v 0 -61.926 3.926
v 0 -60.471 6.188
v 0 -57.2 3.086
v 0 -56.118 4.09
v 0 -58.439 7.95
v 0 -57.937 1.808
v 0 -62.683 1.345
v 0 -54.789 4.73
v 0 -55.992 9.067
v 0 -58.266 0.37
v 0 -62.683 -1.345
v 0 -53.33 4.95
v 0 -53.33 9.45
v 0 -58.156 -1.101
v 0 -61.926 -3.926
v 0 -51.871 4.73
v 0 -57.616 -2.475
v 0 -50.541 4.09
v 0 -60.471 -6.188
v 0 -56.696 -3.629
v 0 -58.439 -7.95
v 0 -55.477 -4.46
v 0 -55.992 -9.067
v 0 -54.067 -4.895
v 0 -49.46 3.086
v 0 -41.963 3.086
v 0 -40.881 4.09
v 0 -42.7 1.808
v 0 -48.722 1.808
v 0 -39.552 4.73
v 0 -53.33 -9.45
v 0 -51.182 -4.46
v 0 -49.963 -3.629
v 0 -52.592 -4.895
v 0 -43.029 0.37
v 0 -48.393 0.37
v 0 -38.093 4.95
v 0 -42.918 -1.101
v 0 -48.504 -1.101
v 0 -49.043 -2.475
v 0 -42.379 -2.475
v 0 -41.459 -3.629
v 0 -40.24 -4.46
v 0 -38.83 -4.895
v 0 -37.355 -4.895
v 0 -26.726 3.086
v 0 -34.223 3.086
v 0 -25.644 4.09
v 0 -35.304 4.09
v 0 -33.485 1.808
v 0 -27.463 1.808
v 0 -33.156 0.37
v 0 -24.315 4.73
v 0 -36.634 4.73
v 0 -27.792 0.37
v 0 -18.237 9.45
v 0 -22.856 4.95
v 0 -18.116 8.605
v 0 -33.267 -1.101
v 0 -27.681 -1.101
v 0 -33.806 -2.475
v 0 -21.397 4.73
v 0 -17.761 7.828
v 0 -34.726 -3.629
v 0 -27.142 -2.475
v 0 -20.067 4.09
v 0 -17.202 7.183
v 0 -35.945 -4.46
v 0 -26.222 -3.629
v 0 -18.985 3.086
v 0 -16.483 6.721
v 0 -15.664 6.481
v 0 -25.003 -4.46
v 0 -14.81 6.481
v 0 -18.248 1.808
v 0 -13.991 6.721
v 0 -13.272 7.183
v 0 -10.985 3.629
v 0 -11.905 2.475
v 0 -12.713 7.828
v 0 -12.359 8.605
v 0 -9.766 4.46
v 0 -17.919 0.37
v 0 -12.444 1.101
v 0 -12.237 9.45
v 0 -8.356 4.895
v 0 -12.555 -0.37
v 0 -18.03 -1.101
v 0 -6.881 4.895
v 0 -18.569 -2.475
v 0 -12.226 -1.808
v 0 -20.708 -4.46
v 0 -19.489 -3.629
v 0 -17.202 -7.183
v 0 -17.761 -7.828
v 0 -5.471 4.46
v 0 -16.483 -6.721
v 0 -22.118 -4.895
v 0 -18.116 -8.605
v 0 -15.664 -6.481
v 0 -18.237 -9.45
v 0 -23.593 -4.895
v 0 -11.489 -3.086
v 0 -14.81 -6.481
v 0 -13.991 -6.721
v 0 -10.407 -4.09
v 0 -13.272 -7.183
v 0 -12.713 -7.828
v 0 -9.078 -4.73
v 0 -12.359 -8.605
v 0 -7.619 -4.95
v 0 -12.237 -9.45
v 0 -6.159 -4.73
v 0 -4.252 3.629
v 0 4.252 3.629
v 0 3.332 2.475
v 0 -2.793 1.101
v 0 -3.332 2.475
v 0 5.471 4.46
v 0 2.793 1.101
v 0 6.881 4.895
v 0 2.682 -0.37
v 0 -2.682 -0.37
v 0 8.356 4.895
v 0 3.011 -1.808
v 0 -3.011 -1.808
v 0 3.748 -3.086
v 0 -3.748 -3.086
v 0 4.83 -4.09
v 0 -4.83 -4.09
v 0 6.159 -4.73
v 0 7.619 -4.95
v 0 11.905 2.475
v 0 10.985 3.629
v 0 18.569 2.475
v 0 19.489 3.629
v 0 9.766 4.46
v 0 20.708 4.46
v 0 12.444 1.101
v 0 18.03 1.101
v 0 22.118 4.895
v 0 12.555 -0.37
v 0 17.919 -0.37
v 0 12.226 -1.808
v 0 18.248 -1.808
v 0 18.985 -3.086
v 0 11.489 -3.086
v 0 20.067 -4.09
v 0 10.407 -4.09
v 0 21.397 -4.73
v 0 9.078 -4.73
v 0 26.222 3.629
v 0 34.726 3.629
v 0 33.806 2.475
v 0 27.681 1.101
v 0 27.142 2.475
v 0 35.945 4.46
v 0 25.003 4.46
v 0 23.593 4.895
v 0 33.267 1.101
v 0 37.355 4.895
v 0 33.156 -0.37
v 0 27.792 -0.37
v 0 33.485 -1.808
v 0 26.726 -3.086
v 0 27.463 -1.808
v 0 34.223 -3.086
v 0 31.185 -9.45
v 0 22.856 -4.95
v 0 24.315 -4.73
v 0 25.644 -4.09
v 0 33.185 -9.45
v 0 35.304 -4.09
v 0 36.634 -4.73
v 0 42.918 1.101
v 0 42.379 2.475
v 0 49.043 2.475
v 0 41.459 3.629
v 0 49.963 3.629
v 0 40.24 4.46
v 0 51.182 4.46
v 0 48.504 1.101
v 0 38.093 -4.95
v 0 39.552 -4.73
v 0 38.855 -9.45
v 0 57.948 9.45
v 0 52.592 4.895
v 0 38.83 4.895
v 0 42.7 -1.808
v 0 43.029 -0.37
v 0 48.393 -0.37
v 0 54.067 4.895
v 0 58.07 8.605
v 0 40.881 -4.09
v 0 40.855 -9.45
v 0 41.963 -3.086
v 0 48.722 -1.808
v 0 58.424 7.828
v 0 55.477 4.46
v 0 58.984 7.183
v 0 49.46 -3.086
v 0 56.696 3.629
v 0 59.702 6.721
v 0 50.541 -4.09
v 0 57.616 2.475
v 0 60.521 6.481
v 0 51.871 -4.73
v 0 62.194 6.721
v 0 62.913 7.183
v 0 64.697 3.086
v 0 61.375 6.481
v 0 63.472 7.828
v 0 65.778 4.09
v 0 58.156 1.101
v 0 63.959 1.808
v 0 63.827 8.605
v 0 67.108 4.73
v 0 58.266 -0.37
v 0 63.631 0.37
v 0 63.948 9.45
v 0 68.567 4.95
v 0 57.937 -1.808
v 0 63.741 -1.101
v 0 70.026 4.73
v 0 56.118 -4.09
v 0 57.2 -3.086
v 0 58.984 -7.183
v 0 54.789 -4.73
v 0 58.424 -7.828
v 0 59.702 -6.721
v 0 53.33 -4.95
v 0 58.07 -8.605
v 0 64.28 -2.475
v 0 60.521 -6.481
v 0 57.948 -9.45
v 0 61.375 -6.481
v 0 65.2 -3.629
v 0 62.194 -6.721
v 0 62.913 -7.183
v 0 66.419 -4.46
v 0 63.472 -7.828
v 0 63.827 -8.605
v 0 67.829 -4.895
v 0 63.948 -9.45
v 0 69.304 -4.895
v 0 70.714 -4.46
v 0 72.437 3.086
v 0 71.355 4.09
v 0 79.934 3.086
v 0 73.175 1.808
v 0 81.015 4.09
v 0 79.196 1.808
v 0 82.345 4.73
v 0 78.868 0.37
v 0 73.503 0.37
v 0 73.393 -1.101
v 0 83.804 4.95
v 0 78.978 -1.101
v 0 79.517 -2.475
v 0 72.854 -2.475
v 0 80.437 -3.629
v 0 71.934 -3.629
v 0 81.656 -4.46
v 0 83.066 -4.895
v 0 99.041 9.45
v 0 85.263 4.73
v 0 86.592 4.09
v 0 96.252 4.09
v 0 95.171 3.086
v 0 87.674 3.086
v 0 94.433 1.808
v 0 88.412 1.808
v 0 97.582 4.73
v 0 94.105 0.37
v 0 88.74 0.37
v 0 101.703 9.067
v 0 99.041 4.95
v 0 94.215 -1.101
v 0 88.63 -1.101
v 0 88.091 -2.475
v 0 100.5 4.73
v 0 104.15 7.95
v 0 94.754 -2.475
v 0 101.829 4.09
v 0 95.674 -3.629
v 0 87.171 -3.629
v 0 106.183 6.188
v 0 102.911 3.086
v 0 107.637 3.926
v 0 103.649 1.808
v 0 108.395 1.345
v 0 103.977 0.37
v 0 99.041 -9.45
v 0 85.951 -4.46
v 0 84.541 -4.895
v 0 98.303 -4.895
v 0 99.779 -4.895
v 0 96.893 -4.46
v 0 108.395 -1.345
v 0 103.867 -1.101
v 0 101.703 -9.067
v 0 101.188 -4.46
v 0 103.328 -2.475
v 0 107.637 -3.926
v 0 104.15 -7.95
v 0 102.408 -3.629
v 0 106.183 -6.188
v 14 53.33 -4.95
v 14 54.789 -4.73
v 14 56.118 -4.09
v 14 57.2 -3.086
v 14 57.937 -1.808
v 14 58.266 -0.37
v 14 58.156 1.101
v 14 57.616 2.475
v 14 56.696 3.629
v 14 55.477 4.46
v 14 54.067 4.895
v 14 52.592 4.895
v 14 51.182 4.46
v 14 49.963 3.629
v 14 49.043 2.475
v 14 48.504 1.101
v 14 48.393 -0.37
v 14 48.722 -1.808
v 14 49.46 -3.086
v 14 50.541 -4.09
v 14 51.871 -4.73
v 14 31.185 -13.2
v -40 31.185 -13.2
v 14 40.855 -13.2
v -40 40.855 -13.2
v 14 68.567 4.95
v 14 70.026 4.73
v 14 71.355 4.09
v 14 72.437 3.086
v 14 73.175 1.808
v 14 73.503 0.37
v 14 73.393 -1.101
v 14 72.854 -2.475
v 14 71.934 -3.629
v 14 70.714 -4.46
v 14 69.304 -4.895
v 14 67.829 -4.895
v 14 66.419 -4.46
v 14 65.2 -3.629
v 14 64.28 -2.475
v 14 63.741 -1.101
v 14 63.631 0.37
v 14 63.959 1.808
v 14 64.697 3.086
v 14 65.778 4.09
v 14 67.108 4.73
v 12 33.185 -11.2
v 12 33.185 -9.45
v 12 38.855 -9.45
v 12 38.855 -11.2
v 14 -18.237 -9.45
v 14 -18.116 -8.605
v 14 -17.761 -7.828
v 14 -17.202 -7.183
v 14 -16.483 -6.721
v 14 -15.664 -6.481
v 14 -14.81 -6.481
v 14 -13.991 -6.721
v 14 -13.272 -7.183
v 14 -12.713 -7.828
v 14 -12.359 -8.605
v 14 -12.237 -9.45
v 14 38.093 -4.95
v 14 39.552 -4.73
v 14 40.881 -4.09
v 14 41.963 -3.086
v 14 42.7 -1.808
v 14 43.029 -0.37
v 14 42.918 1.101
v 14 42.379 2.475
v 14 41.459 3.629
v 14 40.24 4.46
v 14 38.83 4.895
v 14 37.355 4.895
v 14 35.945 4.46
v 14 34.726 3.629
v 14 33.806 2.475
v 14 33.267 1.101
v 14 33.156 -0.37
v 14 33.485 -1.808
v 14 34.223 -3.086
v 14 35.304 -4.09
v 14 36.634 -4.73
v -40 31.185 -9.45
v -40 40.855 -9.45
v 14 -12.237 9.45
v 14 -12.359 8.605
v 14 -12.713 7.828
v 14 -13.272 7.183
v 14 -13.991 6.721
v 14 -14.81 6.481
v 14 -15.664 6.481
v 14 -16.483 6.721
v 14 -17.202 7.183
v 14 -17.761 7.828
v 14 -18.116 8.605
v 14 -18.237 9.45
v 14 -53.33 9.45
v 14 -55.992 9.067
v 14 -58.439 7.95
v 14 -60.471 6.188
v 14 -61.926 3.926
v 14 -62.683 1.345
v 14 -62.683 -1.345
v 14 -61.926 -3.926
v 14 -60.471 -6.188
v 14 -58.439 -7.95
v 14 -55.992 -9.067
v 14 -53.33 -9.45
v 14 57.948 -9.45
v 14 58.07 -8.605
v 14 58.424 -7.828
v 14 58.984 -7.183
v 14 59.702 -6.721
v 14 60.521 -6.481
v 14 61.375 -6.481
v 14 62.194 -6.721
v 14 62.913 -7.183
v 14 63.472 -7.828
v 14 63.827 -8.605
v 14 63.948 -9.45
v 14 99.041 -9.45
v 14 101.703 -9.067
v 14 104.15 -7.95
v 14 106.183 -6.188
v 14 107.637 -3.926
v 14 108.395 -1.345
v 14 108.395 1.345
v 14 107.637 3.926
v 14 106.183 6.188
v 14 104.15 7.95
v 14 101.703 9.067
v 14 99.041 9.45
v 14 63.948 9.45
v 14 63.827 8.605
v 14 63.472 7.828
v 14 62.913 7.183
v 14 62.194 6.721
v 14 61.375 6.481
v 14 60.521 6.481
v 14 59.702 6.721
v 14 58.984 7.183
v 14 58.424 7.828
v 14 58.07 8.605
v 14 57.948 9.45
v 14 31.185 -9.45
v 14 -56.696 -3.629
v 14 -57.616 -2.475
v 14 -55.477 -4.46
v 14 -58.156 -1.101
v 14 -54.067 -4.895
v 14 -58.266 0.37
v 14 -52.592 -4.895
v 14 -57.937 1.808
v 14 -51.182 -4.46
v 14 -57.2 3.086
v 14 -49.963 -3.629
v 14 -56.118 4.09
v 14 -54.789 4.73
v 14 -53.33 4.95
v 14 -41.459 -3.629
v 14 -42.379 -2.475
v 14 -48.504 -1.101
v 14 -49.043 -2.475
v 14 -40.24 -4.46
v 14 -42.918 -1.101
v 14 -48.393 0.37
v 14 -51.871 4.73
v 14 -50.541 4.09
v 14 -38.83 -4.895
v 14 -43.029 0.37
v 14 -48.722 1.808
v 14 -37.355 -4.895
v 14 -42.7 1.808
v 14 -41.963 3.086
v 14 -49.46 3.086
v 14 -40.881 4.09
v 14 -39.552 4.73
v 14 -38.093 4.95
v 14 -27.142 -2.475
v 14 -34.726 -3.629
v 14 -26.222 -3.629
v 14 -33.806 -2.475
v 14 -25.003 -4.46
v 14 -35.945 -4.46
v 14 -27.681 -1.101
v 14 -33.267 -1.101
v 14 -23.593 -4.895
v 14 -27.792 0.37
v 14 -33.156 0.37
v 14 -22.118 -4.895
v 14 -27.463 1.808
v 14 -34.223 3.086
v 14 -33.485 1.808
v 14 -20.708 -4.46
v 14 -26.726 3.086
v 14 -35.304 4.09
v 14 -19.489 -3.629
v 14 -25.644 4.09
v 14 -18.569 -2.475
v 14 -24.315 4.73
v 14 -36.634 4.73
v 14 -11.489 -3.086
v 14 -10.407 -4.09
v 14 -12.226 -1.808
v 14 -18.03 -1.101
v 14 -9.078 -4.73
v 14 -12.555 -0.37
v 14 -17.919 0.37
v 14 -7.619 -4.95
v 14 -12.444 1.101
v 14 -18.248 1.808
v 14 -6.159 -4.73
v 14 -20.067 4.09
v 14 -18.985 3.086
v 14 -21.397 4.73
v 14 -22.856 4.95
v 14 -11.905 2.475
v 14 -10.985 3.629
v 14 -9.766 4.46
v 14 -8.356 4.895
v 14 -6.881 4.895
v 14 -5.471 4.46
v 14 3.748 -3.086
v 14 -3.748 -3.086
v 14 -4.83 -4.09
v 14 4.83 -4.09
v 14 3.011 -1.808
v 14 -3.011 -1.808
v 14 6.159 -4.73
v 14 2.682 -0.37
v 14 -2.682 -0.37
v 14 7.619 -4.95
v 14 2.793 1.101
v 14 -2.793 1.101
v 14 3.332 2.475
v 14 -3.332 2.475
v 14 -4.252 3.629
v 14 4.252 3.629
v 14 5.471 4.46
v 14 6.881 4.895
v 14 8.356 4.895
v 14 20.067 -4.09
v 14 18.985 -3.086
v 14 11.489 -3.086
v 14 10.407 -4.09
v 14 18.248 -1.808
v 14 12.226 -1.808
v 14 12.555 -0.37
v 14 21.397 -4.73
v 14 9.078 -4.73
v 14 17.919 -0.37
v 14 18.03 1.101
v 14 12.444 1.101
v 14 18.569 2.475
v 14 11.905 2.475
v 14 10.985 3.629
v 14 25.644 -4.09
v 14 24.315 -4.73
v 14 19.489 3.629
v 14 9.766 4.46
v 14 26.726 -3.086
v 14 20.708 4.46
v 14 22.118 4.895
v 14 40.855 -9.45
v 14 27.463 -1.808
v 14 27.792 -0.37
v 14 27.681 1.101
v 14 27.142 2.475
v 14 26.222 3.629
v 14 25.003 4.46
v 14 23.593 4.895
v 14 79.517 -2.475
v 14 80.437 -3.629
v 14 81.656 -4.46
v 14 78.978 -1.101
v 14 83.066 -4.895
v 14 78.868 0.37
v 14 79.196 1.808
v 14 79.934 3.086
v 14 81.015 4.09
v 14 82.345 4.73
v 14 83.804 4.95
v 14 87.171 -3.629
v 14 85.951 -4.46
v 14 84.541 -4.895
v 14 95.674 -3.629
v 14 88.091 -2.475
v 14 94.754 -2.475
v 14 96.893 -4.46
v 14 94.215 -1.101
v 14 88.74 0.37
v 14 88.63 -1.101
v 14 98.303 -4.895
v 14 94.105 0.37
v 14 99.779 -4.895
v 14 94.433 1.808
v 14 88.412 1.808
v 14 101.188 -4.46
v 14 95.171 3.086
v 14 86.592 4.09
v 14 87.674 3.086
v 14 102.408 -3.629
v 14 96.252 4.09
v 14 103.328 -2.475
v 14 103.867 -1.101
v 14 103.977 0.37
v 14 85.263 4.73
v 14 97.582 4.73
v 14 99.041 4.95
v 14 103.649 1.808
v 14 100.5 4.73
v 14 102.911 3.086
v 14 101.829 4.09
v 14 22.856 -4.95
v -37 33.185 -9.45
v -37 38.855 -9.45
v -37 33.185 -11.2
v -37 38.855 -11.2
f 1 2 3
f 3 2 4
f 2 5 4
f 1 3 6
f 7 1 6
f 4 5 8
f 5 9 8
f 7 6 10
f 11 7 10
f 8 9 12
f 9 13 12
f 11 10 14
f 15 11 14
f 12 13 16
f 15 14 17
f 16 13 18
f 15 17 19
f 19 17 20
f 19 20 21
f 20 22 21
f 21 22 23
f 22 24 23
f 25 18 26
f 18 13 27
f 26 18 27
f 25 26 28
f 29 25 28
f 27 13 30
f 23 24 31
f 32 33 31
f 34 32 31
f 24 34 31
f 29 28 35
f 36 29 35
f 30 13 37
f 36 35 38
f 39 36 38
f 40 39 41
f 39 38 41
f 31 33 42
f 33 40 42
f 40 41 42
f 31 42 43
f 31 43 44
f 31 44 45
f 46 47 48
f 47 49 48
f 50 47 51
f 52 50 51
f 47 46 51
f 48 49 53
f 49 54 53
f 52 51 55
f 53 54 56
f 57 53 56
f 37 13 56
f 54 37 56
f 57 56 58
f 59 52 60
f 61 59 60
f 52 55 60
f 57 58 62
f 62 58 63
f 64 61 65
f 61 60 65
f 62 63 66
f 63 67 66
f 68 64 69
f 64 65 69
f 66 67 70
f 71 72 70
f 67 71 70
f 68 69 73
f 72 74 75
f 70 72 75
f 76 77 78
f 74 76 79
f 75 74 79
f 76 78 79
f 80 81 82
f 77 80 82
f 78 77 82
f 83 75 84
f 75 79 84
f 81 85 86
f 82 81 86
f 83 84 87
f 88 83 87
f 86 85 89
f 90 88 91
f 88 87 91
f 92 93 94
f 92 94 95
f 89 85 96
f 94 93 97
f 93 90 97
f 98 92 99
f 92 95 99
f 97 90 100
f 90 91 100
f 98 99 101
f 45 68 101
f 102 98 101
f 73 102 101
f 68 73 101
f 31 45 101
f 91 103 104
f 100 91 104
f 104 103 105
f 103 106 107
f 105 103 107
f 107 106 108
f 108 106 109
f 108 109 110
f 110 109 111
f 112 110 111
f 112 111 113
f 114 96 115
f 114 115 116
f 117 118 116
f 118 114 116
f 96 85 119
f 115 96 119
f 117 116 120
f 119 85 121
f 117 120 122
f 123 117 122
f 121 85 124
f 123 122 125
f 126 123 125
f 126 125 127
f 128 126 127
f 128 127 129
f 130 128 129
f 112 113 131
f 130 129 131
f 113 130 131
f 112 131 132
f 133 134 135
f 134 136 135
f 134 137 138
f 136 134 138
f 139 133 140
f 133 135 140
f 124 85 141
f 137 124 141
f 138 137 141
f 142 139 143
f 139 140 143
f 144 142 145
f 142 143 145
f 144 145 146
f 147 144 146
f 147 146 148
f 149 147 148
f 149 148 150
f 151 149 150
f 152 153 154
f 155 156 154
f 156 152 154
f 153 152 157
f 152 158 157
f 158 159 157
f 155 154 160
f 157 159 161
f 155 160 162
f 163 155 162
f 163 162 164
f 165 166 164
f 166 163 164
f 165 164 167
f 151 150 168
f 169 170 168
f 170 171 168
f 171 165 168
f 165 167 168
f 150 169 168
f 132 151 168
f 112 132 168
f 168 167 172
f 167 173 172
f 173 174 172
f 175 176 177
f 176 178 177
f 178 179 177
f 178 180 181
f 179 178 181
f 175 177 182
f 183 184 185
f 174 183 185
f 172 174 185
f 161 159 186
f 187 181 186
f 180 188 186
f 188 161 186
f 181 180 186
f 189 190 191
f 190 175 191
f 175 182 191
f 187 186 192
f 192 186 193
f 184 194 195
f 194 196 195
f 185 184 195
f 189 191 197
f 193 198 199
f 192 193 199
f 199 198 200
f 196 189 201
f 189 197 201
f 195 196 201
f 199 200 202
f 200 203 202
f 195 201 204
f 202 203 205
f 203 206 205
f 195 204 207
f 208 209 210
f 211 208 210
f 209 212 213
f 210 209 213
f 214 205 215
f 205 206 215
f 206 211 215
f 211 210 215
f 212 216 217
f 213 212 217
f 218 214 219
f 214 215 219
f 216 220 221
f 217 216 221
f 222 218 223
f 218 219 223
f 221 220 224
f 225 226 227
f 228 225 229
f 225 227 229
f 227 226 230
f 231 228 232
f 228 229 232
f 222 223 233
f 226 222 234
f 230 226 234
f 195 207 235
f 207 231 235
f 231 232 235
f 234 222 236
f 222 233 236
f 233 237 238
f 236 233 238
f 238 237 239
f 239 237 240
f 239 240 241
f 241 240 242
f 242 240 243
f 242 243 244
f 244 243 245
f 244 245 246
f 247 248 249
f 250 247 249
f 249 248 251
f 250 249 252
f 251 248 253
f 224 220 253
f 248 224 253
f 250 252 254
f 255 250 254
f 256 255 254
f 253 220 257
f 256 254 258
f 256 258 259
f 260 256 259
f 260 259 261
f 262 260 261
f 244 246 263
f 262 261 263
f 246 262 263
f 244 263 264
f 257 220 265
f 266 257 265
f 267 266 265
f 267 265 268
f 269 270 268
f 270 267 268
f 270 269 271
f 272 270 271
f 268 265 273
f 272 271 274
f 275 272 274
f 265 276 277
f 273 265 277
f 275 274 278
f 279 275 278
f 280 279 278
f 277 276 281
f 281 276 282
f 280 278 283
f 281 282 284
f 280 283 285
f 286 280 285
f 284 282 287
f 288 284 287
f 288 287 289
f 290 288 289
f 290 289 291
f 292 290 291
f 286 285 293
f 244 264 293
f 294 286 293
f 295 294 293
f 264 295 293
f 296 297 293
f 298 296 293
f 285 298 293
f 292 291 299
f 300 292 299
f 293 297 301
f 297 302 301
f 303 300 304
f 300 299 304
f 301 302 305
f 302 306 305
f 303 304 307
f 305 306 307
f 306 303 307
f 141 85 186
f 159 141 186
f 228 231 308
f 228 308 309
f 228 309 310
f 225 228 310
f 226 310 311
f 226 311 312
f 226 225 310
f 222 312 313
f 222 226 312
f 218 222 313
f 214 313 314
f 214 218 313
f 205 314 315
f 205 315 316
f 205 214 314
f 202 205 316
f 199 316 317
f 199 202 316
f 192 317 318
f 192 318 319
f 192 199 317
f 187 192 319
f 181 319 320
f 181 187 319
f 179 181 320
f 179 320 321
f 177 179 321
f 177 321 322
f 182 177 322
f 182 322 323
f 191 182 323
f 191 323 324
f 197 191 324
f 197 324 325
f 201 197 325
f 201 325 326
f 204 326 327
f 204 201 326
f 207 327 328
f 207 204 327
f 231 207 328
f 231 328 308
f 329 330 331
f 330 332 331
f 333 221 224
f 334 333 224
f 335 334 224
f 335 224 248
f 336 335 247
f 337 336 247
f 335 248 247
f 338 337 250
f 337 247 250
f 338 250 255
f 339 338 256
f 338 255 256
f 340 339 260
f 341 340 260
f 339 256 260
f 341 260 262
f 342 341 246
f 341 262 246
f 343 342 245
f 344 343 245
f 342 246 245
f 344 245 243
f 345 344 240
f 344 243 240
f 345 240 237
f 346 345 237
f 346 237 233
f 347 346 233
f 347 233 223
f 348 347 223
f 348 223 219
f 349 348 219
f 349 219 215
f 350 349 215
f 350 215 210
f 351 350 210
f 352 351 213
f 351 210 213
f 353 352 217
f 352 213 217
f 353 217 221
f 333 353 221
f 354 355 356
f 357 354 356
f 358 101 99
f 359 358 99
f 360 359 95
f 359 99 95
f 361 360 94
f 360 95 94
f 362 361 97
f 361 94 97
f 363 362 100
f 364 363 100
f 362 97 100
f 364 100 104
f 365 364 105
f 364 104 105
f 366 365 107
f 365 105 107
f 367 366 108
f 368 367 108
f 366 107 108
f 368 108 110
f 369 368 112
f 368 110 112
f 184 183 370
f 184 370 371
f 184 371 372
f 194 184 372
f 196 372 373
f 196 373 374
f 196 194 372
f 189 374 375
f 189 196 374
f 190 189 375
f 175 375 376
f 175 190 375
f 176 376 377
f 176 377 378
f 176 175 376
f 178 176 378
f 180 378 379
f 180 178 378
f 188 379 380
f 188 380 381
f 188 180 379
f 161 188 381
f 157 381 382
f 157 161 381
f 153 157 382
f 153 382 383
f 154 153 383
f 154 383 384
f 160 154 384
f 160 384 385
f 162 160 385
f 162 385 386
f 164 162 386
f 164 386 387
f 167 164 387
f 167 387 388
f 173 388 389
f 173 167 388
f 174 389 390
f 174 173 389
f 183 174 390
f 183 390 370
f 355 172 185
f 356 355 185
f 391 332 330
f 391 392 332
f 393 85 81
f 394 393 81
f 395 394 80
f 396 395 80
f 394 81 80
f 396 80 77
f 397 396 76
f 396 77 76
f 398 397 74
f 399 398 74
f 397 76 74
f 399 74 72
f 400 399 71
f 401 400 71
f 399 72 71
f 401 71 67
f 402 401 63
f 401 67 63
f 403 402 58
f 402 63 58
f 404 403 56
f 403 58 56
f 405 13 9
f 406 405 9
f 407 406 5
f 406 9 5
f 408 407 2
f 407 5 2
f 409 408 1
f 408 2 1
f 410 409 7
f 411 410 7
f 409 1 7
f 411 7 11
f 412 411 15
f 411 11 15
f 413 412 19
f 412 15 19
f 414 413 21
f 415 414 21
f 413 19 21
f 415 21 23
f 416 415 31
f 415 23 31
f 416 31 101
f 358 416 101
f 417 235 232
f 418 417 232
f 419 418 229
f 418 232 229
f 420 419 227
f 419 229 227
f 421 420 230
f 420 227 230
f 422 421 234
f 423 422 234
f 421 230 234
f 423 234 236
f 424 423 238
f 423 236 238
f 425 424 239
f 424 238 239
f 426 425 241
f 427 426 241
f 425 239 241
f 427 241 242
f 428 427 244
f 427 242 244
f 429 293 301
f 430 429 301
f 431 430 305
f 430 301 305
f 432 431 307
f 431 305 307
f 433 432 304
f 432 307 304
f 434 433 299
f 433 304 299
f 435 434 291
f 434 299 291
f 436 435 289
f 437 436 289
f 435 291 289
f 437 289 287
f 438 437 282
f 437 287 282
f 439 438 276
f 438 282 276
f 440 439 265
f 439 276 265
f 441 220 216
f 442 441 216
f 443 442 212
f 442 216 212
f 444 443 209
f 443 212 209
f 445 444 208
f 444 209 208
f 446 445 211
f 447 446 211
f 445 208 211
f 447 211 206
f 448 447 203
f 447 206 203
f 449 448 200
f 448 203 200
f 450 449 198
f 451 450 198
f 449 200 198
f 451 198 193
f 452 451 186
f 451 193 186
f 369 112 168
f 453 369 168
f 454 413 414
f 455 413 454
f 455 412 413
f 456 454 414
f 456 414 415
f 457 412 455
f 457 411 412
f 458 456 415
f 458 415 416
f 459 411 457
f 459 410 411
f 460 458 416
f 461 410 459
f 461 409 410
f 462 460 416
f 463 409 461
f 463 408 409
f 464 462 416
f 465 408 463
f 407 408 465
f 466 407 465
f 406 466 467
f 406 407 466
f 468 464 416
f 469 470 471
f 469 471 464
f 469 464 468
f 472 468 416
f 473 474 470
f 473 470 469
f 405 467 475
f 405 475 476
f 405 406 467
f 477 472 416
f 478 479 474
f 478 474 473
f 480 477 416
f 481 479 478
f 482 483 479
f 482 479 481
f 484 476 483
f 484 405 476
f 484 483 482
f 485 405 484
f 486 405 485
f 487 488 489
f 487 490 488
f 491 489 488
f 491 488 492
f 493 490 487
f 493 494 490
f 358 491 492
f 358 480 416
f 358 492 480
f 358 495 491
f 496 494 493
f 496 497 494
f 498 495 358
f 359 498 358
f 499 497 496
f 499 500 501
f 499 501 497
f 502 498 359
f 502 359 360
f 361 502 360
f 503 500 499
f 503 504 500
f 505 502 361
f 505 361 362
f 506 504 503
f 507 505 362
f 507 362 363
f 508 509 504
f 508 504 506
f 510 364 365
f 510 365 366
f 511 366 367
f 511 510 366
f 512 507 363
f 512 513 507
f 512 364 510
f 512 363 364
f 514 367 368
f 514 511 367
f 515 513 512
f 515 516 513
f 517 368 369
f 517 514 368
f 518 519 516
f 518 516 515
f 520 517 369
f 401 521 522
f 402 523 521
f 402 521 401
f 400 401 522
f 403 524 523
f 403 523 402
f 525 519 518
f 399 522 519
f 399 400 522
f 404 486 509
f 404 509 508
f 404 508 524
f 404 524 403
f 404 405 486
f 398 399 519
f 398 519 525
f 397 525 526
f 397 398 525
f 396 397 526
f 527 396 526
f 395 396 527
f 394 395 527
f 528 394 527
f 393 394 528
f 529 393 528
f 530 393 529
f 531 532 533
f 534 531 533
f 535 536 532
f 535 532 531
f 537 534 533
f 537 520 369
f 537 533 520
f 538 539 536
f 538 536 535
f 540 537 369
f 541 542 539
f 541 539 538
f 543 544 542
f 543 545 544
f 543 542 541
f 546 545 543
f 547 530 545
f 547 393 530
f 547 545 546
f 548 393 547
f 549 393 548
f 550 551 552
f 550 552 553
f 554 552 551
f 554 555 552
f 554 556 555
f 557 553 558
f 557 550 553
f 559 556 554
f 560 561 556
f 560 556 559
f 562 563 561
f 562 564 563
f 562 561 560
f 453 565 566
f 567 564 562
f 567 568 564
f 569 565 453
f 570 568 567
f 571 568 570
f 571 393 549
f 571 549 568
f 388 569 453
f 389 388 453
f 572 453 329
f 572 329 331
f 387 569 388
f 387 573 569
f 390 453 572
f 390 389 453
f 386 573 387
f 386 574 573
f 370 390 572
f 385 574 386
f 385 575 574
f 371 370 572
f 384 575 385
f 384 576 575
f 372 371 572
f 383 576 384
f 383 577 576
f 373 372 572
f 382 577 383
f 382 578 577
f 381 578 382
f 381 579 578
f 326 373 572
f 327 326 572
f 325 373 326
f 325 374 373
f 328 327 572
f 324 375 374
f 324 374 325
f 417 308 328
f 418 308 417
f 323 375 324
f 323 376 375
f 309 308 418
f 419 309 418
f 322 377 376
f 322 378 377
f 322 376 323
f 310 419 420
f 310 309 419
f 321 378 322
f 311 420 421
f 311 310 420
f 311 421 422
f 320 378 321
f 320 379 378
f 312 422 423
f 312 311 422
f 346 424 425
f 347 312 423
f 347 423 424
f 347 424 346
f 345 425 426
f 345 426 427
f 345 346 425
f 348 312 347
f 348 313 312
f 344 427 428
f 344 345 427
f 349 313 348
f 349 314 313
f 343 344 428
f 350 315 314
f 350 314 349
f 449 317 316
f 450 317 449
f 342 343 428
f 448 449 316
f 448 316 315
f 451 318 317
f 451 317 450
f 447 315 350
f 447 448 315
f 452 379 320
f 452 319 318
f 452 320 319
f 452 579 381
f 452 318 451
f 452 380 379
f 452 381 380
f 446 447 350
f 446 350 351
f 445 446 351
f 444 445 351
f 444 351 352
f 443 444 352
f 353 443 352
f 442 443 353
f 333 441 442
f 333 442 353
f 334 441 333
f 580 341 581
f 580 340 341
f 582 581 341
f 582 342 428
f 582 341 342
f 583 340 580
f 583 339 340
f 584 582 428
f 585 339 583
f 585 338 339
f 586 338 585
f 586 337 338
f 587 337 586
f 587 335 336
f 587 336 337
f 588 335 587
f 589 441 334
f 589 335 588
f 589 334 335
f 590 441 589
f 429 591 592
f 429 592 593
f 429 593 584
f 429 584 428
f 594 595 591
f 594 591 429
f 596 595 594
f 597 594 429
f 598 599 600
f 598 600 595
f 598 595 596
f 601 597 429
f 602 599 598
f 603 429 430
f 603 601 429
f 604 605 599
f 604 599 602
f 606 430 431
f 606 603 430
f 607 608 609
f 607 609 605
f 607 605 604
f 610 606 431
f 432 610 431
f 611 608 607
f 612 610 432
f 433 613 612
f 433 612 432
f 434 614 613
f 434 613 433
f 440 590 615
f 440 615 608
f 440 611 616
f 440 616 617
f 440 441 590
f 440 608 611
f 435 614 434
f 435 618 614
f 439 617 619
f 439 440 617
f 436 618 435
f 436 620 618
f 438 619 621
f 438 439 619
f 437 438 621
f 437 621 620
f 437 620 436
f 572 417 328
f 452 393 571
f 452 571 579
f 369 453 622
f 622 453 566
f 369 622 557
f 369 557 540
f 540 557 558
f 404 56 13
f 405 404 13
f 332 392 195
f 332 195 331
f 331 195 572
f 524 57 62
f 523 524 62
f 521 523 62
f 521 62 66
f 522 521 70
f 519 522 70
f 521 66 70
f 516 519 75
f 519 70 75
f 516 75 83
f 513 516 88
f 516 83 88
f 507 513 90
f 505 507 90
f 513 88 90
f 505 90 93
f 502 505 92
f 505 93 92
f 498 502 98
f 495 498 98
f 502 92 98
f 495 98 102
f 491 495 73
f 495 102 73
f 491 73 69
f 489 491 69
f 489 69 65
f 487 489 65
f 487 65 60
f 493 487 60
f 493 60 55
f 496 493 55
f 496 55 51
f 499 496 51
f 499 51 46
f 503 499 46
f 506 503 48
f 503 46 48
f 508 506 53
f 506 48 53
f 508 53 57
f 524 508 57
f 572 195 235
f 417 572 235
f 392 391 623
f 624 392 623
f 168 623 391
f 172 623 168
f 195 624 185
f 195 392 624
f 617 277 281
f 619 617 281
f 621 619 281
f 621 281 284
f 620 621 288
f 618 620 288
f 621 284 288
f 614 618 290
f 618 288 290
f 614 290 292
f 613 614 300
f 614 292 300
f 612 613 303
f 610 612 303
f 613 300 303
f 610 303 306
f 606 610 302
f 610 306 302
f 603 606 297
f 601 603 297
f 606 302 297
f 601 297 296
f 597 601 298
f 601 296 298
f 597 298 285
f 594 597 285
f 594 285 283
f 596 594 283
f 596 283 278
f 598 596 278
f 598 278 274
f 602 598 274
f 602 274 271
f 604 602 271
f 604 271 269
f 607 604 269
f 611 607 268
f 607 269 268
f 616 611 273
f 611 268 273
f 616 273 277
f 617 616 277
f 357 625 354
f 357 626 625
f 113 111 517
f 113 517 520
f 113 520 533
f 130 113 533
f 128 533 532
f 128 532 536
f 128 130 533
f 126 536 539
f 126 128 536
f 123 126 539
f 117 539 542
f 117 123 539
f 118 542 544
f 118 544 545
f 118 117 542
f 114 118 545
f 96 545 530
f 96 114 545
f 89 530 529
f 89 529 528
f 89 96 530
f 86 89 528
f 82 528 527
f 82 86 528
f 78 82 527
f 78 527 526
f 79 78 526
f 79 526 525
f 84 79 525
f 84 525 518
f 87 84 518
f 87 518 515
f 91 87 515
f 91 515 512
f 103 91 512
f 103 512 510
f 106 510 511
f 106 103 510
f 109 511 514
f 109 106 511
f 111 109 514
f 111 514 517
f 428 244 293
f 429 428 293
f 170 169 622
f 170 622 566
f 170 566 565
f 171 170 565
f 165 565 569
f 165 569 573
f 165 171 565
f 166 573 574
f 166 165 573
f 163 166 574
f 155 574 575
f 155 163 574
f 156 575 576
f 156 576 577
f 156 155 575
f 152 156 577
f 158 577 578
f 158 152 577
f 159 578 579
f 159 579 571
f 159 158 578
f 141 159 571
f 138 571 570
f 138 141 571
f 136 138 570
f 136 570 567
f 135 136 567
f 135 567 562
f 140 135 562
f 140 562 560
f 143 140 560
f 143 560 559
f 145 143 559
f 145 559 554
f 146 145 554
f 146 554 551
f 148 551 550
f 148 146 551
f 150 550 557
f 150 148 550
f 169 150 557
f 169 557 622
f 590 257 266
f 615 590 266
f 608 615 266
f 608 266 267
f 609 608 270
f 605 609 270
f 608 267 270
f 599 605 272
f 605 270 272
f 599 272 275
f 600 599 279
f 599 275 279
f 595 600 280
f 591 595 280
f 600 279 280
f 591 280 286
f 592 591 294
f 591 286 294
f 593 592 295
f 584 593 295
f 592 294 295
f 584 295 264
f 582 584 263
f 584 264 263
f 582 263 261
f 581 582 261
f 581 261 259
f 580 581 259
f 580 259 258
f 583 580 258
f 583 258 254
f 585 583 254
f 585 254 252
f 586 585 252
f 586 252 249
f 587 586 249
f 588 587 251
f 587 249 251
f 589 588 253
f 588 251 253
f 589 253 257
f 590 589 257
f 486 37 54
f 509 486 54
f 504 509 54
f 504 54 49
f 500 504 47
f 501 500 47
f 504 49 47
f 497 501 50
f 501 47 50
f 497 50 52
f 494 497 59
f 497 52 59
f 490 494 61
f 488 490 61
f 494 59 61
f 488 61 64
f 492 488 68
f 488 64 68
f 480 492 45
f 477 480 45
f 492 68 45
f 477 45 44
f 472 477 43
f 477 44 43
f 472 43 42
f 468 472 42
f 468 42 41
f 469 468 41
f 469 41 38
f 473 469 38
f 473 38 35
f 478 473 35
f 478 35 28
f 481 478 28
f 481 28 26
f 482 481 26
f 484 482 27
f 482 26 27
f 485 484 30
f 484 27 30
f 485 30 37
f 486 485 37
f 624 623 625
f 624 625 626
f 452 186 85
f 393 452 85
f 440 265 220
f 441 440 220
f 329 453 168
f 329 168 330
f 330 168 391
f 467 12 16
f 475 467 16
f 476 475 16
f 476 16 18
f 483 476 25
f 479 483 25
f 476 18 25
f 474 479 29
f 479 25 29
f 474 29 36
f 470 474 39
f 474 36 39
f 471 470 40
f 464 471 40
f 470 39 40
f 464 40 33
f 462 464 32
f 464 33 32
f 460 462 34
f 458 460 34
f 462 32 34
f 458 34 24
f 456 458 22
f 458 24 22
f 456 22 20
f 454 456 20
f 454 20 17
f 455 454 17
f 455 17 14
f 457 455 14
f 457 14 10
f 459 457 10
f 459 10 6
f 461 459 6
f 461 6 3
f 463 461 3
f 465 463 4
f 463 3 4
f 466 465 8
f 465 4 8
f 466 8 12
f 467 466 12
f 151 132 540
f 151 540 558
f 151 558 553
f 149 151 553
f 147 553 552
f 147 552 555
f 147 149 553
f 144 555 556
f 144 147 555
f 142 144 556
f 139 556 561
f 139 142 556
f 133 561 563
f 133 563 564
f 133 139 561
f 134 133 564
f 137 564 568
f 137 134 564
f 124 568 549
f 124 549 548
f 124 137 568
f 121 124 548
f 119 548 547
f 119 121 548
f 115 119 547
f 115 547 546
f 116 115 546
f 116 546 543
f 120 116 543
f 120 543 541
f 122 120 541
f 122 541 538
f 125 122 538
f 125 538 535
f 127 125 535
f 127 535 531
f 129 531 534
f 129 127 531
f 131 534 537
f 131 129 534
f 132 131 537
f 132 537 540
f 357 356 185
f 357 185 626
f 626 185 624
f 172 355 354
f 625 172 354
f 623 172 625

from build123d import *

# Parameters (mm, degrees)
SKETCH_1_R      = 4.95
EXTRUDE_1_DEPTH = 14
SKETCH_3_W      = 14
SKETCH_3_H      = 60.948164725
EXTRUDE_2_DEPTH = 3
SKETCH_4_R      = 4.95
EXTRUDE_3_DEPTH = 14
SKETCH_5_W      = 49
SKETCH_5_H      = 5.67
EXTRUDE_4_DEPTH = 1.75
EXTRUDE_5_DEPTH = 2


with BuildPart() as part:
    # Эскиз1 → Бобышка-Вытянуть1 (new body)
    with BuildSketch(Plane(origin=(0, 0, 0), x_dir=(0, 0, -1), z_dir=(1, 0, 0))):
        with BuildLine():
            Line((6.45, 38.092602953), (6.45, 53.329644134))
            ThreePointArc((6.45, 53.329644134), (0, 59.779644134), (-6.45, 53.329644134))
            Line((-6.45, 53.329644134), (-6.45, 38.092602953))
            Line((-6.45, 38.092602953), (-6.45, 22.855561772))
            Line((-6.45, 22.855561772), (-6.45, 7.618520591))
            Line((-6.45, 7.618520591), (-6.45, -7.618520591))
            ThreePointArc((-6.45, -7.618520591), (0, -14.068520591), (6.45, -7.618520591))
            Line((6.45, -7.618520591), (6.45, 7.618520591))
            Line((6.45, 7.618520591), (6.45, 22.855561772))
            Line((6.45, 22.855561772), (6.45, 38.092602953))
        make_face()
        with Locations((0, 7.618520591)):
            Circle(SKETCH_1_R, mode=Mode.SUBTRACT)
        with Locations((0, -7.618520591)):
            Circle(SKETCH_1_R, mode=Mode.SUBTRACT)
        with Locations((0, 22.855561772)):
            Circle(SKETCH_1_R, mode=Mode.SUBTRACT)
        with Locations((0, 38.092602953)):
            Circle(SKETCH_1_R, mode=Mode.SUBTRACT)
        with Locations((0, 53.329644134)):
            Circle(SKETCH_1_R, mode=Mode.SUBTRACT)
    extrude(amount=EXTRUDE_1_DEPTH)

    # Эскиз3 → Бобышка-Вытянуть2 (add)
    with BuildSketch(Plane(origin=(0, 0, -6.45), x_dir=(-1, 0, 0), z_dir=(0, 0, -1))):
        with Locations((-7, 22.855561772)):
            Rectangle(SKETCH_3_W, SKETCH_3_H)
    extrude(amount=EXTRUDE_2_DEPTH)

    # Эскиз4 → Бобышка-Вытянуть3 (add)
    with BuildSketch(Plane.ZY):
        with BuildLine():
            Line((-9.45, 53.329644134), (-9.45, 57.948164724))
            ThreePointArc((-9.45, 57.948164724), (-6.45, 60.948164724), (-9.45, 63.948164724))
            Line((-9.45, 63.948164724), (-9.45, 99.040767677))
            ThreePointArc((-9.45, 99.040767677), (0, 108.490767677), (9.45, 99.040767677))
            Line((9.45, 99.040767677), (9.45, 63.948164724))
            ThreePointArc((9.45, 63.948164724), (6.45, 60.948164724), (9.45, 57.948164724))
            Line((9.45, 57.948164724), (9.45, -12.237041181))
            ThreePointArc((9.45, -12.237041181), (6.45, -15.237041181), (9.45, -18.237041181))
            Line((9.45, -18.237041181), (9.45, -53.329644134))
            ThreePointArc((9.45, -53.329644134), (0, -62.779644134), (-9.45, -53.329644134))
            Line((-9.45, -53.329644134), (-9.45, -18.237041181))
            ThreePointArc((-9.45, -18.237041181), (-6.45, -15.237041181), (-9.45, -12.237041181))
            Line((-9.45, -12.237041181), (-9.45, 53.329644134))
        make_face()
        with Locations((0, 99.040767677)):
            Circle(SKETCH_4_R, mode=Mode.SUBTRACT)
        with Locations((0, 83.803726496)):
            Circle(SKETCH_4_R, mode=Mode.SUBTRACT)
        with Locations((0, 68.566685315)):
            Circle(SKETCH_4_R, mode=Mode.SUBTRACT)
        with Locations(Location((0, 53.329644134, 0), (0, 0, 180))):
            Circle(SKETCH_4_R, mode=Mode.SUBTRACT)
        with Locations((0, -53.329644134)):
            Circle(SKETCH_4_R, mode=Mode.SUBTRACT)
        with Locations((0, -38.092602953)):
            Circle(SKETCH_4_R, mode=Mode.SUBTRACT)
        with Locations((0, -22.855561772)):
            Circle(SKETCH_4_R, mode=Mode.SUBTRACT)
        with Locations(Location((0, -7.618520591, 0), (0, 0, 180))):
            Circle(SKETCH_4_R, mode=Mode.SUBTRACT)
        with Locations(Location((0, 38.092602953, 0), (0, 0, 180))):
            Circle(SKETCH_4_R, mode=Mode.SUBTRACT)
        with Locations(Location((0, 22.855561772, 0), (0, 0, 180))):
            Circle(SKETCH_4_R, mode=Mode.SUBTRACT)
        with Locations(Location((0, 7.618520591, 0), (0, 0, 180))):
            Circle(SKETCH_4_R, mode=Mode.SUBTRACT)
    extrude(amount=-EXTRUDE_3_DEPTH)

    # Эскиз5 → Бобышка-Вытянуть4 (add)
    with BuildSketch(Plane(origin=(0, 0, -9.45), x_dir=(-1, 0, 0), z_dir=(0, 0, -1))):
        Polygon((-14, 31.185355866), (-14, 40.855355866), (39, 40.855355866), (40, 40.855355866), (40, 31.185355866), (39, 31.185355866), align=None)
        with Locations((12.5, 36.020355866)):
            Rectangle(SKETCH_5_W, SKETCH_5_H, mode=Mode.SUBTRACT)
    extrude(amount=EXTRUDE_4_DEPTH)

    # Эскиз6 → Бобышка-Вытянуть5 (add)
    with BuildSketch(Plane(origin=(0, 0, -11.2), x_dir=(-1, 0, 0), z_dir=(0, 0, -1))):
        Polygon((39, 31.185355866), (-14, 31.185355866), (-14, 40.855355866), (39, 40.855355866), (40, 40.855355866), (40, 31.185355866), align=None)
    extrude(amount=EXTRUDE_5_DEPTH)


solid = part.part
